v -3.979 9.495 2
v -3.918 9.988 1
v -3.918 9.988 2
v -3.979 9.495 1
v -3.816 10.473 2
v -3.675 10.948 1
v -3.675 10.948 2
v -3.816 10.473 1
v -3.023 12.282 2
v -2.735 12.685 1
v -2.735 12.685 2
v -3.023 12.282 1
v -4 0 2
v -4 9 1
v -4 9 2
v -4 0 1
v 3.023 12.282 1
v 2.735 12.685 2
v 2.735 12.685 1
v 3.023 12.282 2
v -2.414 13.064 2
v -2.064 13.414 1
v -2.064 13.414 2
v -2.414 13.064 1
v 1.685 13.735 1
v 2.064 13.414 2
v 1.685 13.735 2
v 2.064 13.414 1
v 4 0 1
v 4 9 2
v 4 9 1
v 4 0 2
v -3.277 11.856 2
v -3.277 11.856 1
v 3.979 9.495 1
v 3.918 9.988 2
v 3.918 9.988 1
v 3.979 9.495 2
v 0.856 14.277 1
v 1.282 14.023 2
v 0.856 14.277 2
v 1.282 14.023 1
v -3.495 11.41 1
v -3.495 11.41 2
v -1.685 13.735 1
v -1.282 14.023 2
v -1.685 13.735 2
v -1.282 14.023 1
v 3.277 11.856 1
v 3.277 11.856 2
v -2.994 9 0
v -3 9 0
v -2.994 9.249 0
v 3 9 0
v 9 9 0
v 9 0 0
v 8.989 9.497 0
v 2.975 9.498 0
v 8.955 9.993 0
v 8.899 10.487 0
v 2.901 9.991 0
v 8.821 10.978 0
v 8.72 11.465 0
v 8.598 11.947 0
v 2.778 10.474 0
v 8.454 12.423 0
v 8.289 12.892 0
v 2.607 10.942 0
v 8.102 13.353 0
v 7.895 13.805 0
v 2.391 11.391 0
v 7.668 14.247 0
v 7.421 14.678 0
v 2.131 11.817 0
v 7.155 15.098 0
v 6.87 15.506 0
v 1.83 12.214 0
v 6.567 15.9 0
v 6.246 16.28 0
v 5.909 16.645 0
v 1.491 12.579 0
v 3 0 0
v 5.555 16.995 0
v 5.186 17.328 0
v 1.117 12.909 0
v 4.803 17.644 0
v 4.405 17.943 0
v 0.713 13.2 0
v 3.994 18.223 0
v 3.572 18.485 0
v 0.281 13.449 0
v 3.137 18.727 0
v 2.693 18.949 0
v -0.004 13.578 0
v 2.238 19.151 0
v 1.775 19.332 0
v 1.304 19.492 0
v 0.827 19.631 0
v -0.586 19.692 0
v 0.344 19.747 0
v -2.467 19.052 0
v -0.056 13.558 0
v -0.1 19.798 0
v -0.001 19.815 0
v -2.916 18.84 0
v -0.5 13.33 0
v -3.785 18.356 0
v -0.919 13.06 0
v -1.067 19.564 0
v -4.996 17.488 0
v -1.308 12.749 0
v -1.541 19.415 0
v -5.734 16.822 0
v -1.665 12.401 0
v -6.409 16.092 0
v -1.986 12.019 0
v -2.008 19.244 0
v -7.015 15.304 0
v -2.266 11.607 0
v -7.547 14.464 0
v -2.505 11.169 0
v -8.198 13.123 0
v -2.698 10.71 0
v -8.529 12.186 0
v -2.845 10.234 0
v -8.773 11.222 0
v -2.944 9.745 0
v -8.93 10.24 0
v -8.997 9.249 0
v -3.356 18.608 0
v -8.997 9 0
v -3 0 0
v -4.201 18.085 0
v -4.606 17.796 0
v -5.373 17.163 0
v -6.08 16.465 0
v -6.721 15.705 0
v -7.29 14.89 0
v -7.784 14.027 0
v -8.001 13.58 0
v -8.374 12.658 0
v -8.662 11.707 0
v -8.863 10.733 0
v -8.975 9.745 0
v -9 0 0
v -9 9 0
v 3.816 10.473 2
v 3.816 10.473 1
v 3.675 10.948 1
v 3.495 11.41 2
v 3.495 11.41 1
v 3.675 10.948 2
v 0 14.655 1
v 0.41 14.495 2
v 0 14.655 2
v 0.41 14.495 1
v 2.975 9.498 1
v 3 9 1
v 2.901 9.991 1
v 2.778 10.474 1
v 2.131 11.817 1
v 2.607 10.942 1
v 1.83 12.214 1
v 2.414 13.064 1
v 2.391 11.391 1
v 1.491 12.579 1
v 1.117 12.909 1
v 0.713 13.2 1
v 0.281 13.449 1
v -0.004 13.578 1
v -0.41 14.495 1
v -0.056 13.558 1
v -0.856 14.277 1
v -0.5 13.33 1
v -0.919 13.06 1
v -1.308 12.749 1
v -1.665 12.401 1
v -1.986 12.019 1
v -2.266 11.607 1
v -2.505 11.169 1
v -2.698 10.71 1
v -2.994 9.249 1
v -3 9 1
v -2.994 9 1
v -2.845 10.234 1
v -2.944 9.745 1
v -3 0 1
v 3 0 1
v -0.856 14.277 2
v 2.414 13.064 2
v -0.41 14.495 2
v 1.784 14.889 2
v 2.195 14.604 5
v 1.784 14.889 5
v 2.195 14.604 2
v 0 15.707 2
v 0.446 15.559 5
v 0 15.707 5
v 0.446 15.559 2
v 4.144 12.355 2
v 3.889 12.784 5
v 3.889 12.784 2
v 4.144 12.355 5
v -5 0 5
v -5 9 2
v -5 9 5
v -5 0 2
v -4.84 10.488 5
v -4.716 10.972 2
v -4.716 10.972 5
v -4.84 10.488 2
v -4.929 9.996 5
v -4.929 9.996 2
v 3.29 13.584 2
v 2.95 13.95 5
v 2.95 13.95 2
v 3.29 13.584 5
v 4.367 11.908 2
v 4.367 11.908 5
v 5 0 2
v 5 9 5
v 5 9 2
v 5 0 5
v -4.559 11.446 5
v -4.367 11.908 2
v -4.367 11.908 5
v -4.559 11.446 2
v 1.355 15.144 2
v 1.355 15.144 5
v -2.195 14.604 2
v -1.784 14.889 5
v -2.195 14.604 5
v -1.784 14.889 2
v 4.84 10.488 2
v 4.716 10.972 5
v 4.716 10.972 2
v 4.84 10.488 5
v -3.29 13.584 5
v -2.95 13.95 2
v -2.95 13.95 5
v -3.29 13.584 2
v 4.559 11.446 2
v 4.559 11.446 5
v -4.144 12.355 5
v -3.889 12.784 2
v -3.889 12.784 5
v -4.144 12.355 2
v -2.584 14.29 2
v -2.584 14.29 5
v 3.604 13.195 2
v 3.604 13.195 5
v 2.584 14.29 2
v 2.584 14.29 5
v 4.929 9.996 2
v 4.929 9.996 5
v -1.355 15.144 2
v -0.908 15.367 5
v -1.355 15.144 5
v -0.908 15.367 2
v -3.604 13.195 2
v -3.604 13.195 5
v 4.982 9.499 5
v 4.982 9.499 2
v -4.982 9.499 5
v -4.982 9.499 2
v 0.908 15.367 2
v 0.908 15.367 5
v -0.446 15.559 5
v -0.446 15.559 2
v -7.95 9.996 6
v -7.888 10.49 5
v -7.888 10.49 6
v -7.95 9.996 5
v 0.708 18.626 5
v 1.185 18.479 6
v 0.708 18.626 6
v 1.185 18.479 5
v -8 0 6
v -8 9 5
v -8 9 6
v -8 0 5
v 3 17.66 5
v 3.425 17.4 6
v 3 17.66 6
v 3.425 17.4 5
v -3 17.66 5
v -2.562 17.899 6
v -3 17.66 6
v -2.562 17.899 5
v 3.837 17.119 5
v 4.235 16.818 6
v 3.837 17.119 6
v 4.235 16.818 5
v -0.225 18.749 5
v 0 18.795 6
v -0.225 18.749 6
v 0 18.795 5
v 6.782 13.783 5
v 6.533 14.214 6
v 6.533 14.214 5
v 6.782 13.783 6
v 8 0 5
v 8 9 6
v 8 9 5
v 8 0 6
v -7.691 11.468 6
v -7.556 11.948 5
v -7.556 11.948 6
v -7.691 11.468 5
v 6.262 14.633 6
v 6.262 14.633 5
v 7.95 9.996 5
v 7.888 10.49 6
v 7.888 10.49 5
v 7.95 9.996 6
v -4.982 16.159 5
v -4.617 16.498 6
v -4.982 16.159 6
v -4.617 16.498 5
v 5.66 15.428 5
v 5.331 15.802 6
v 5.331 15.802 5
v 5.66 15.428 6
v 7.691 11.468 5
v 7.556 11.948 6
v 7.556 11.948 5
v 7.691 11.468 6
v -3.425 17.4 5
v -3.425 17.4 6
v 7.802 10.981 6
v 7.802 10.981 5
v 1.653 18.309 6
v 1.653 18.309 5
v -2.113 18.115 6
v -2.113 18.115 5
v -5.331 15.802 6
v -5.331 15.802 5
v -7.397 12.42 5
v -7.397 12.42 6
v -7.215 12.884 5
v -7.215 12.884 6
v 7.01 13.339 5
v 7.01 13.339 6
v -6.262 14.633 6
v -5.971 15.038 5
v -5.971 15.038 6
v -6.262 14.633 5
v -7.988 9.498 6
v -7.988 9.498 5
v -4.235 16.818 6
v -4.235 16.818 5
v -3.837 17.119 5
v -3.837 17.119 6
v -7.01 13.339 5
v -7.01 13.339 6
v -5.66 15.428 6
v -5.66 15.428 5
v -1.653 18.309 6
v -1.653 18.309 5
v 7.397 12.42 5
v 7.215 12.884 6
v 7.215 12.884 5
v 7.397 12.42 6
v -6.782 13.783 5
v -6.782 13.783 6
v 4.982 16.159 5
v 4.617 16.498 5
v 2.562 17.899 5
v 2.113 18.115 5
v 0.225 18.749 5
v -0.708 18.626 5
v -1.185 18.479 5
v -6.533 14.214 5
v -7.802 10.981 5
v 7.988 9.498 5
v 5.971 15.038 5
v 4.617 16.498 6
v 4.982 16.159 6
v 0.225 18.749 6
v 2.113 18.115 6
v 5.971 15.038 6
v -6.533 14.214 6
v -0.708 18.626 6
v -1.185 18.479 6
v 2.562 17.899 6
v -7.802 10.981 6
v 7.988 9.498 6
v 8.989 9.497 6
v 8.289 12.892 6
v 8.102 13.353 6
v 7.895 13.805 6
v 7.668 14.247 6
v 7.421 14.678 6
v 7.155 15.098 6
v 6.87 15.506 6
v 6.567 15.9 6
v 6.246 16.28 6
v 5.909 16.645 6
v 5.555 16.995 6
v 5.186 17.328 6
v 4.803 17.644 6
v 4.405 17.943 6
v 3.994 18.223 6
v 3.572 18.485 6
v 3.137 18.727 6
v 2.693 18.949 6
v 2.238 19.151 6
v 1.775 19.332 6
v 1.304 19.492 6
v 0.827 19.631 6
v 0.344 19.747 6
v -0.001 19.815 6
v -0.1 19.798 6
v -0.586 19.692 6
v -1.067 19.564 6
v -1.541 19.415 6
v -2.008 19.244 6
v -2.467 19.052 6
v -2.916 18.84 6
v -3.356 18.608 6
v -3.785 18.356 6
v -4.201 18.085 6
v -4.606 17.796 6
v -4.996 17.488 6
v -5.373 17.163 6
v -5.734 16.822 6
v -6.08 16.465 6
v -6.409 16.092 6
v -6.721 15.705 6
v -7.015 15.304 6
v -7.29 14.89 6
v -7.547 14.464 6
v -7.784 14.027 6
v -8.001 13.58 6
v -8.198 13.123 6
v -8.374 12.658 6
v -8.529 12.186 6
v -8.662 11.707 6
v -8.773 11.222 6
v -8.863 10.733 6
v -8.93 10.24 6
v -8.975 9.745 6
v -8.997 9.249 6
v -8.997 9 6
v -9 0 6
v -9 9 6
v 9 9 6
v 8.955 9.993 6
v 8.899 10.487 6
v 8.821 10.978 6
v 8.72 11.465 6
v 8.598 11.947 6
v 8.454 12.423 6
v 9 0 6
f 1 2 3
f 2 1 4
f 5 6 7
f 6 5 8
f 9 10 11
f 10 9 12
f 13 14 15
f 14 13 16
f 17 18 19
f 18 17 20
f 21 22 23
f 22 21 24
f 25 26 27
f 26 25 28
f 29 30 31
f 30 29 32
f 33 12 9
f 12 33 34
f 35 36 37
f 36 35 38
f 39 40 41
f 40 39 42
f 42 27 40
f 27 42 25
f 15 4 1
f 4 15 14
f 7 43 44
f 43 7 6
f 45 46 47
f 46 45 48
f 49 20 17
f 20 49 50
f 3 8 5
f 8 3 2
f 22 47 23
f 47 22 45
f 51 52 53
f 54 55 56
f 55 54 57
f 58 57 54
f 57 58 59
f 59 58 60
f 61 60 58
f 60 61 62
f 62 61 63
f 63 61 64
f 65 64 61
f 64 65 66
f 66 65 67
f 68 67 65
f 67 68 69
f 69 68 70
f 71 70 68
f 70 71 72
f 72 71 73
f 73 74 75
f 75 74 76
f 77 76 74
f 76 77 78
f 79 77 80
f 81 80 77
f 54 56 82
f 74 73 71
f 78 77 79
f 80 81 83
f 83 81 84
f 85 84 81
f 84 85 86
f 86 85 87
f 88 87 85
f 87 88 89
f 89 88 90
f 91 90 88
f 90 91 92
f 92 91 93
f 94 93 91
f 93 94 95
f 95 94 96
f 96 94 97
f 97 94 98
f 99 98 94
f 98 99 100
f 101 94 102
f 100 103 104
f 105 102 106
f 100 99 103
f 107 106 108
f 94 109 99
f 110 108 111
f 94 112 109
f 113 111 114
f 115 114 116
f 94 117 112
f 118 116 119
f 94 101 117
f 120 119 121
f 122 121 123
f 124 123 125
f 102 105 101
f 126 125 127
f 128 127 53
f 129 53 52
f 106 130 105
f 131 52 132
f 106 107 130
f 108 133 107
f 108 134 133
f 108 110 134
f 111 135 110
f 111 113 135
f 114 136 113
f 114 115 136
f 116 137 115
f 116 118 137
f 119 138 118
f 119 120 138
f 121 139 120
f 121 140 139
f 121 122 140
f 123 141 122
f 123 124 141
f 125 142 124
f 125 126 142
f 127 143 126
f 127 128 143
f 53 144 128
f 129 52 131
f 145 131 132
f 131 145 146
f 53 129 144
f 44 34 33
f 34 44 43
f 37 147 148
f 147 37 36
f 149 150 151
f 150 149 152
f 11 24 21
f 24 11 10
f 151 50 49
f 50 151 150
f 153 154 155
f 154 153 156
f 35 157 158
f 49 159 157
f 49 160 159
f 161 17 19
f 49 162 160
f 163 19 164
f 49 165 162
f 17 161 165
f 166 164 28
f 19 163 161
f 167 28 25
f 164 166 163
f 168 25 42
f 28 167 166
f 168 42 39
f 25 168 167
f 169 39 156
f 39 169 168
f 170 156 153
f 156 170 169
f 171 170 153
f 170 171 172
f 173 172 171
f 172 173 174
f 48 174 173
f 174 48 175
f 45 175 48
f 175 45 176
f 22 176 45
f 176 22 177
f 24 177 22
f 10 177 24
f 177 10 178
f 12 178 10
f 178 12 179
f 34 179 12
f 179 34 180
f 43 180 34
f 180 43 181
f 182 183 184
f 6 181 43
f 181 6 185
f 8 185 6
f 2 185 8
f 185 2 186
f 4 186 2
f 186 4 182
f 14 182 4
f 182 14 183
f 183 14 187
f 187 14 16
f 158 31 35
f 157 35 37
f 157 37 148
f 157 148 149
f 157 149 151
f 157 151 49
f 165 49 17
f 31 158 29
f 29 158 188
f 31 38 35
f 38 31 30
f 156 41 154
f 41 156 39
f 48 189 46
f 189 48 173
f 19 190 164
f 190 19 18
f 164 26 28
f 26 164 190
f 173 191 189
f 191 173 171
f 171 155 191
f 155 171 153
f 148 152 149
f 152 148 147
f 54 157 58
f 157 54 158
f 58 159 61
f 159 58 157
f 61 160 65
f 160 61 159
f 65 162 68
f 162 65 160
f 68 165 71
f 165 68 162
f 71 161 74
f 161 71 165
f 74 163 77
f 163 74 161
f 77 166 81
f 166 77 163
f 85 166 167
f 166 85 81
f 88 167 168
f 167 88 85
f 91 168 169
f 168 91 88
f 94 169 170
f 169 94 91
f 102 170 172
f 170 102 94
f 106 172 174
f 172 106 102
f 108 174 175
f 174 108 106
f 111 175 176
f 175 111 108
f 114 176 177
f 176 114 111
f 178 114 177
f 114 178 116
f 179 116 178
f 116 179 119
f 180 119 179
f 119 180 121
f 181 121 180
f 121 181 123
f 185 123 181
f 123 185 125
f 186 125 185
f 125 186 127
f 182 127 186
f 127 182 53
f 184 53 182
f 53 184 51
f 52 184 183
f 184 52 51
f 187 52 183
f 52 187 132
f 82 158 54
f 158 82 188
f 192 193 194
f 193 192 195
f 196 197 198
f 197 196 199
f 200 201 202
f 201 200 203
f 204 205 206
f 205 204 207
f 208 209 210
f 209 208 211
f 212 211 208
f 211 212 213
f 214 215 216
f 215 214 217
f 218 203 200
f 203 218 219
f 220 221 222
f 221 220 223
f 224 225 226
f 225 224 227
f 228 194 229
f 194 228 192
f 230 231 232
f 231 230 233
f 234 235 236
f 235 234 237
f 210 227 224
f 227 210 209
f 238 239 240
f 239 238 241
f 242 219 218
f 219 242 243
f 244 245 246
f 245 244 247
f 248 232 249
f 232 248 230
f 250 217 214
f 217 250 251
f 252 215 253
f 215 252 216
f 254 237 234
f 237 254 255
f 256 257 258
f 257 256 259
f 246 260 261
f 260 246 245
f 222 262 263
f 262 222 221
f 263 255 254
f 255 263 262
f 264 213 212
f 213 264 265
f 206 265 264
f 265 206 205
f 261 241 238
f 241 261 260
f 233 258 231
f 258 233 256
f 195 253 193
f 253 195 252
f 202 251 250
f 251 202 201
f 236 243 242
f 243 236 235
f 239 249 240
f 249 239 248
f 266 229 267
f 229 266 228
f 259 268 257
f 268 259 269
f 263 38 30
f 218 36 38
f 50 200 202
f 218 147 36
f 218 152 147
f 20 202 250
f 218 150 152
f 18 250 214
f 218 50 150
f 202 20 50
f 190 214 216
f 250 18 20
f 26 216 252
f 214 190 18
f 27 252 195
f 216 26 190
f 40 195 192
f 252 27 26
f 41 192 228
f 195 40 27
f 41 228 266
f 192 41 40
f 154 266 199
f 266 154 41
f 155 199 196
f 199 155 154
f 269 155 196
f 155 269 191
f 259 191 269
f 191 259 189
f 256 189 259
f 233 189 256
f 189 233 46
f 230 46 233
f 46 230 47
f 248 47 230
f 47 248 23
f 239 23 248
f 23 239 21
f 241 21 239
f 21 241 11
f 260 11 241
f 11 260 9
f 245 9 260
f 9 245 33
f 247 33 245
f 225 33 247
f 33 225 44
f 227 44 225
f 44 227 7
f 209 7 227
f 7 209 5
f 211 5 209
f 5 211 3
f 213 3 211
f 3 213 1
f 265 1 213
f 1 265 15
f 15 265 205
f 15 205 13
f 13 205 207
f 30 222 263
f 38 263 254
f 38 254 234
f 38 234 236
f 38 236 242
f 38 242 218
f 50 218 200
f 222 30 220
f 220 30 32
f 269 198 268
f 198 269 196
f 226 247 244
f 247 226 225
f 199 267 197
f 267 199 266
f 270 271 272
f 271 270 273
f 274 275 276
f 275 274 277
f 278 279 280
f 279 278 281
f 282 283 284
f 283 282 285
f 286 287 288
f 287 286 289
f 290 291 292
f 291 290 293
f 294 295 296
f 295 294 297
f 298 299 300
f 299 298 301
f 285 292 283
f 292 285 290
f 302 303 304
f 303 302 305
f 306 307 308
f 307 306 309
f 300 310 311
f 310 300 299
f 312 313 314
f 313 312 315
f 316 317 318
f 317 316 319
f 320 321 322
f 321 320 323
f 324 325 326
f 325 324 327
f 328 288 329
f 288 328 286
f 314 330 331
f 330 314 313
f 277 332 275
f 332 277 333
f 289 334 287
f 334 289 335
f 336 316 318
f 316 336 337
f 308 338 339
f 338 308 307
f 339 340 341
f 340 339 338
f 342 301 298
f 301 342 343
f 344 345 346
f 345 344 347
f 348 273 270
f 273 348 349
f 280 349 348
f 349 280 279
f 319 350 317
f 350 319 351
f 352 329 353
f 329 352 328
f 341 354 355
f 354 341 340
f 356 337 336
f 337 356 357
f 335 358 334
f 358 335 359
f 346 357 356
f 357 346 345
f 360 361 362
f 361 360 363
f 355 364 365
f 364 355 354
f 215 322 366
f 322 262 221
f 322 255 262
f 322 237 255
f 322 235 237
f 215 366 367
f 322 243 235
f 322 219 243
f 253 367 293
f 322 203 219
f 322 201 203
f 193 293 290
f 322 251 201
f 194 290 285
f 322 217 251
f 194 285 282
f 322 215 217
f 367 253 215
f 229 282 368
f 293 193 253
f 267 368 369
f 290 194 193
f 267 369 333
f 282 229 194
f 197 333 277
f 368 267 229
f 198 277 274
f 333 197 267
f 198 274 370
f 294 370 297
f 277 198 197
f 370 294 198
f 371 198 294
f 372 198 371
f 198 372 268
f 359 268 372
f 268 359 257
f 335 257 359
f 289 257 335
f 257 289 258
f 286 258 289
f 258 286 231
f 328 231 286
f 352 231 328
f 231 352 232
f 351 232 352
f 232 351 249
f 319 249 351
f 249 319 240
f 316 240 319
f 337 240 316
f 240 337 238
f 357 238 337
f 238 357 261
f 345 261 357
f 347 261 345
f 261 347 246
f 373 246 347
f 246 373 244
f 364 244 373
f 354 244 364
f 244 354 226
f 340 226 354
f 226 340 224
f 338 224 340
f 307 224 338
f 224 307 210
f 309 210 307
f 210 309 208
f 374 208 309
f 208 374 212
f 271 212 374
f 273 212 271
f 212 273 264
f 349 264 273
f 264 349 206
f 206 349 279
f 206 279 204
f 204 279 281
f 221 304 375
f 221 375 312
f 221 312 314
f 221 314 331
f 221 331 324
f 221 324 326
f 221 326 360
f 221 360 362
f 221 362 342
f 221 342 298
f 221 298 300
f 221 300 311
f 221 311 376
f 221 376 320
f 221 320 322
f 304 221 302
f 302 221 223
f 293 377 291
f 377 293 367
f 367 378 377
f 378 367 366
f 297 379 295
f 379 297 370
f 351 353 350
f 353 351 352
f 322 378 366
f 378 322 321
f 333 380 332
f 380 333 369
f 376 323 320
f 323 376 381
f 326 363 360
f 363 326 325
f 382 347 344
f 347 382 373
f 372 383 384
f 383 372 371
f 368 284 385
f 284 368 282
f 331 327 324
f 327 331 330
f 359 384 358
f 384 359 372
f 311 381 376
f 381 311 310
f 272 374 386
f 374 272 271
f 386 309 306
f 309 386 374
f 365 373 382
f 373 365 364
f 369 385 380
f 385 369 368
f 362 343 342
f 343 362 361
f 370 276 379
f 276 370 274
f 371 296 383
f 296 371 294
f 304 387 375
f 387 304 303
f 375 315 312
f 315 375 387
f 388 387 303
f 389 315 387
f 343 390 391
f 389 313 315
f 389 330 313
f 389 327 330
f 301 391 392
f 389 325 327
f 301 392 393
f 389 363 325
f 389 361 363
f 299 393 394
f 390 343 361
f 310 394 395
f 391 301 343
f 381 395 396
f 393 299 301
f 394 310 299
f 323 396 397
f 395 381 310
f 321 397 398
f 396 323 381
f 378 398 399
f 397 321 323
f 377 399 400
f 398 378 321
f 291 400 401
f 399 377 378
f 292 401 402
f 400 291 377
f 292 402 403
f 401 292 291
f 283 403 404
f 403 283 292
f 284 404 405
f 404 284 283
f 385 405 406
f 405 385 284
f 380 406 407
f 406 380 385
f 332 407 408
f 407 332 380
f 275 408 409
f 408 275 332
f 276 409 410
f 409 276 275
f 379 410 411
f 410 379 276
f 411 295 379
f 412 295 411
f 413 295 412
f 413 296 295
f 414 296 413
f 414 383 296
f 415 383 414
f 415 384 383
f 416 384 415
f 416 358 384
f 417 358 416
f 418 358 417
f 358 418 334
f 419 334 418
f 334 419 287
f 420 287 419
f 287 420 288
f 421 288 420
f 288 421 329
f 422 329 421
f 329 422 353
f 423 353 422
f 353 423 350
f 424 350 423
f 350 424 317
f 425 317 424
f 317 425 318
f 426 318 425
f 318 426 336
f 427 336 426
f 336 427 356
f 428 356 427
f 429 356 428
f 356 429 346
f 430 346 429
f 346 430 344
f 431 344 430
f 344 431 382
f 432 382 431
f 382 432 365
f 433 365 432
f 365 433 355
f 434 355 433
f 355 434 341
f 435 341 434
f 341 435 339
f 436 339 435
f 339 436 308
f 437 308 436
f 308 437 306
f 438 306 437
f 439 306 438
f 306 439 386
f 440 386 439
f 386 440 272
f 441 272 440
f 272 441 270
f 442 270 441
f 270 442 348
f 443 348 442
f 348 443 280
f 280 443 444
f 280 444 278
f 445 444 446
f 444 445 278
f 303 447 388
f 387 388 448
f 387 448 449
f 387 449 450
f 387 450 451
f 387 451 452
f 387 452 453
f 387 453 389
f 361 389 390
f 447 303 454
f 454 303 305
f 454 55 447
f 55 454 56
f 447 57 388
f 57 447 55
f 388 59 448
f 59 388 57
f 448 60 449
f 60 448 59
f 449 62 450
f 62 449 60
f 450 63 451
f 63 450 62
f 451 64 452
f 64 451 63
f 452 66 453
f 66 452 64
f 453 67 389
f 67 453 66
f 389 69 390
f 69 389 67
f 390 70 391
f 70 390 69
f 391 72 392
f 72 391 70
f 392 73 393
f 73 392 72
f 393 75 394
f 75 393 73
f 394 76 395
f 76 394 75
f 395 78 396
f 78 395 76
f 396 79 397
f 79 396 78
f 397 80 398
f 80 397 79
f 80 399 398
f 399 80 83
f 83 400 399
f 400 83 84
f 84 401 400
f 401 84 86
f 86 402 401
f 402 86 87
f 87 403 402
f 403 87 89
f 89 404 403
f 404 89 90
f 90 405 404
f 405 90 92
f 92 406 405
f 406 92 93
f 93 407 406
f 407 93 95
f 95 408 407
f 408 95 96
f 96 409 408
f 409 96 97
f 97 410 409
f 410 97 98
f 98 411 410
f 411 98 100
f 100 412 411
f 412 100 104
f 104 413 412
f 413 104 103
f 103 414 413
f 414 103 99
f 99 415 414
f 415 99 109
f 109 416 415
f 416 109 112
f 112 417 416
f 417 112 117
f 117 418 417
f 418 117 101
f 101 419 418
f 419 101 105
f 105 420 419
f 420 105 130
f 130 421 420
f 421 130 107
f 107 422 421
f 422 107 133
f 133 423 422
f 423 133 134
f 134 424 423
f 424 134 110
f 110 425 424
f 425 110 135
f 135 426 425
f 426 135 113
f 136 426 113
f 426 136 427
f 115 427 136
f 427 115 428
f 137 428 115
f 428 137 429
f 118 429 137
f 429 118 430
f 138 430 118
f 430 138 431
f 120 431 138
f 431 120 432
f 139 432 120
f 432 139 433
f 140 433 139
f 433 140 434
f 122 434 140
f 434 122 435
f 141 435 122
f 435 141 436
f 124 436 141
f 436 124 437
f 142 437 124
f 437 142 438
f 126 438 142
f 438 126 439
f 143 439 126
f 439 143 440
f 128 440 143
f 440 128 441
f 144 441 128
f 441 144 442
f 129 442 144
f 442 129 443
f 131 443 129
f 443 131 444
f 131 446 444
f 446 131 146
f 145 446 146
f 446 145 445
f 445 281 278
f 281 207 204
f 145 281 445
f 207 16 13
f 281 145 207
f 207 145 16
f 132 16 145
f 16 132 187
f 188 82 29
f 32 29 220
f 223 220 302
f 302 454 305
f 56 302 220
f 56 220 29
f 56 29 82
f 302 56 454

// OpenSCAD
module arch(x,y,r,d) {
    linear_extrude(height=d)
      union() {
        intersection () {
           translate([x,y,0]) circle(r);
           translate([-x,y,0]) circle(r);
      }
      translate([0,y/2,0]) square(size=[2 *(r-x), y],center=true);
 }
};

module archway(x,y,r,d,t) {
  translate([0,-1,0]) 
      difference () {
         arch(x,y,r,d);
         translate([0,0,-1]) arch(x,y,r-t,d+ 2);
  }
}

module nested_archway (x,y,r,d,t,n) {
  union() {
     for (i=[0:n-1]) {
       archway(x,y,r+i*t,d+i*t,t);
    }
  }
}

function v_sum_r(v,n,k) =
      k > n ? 0 : v[k] + v_sum_r(v,n,k+1);

function v_sum(v,n) = v_sum_r(v,n-1,0);

module nested_archway_2 (x,y,r,d,t,n) {
  union() {
      archway(x,y,r,d[0], t[0]);
      if (n > 0)
       for (i=[1:n]) {
       assign(dt =  v_sum(t,i), dd = v_sum(d,i)) {
          echo(dt); echo(dd);
          archway(x,y,r+dt,d[0]+dd, t[i-1]);
      }
    }
  }
}


module remove_ground() {
   difference()  {
     child(0);
     translate([0,-50,0]) cube([100,100,100],center=true);
  }
}

$fa = 0.01; $fs = 0.5; 

remove_ground () 
    nested_archway_2(2,10,6,[1,3,1],[1,3,1],3);
